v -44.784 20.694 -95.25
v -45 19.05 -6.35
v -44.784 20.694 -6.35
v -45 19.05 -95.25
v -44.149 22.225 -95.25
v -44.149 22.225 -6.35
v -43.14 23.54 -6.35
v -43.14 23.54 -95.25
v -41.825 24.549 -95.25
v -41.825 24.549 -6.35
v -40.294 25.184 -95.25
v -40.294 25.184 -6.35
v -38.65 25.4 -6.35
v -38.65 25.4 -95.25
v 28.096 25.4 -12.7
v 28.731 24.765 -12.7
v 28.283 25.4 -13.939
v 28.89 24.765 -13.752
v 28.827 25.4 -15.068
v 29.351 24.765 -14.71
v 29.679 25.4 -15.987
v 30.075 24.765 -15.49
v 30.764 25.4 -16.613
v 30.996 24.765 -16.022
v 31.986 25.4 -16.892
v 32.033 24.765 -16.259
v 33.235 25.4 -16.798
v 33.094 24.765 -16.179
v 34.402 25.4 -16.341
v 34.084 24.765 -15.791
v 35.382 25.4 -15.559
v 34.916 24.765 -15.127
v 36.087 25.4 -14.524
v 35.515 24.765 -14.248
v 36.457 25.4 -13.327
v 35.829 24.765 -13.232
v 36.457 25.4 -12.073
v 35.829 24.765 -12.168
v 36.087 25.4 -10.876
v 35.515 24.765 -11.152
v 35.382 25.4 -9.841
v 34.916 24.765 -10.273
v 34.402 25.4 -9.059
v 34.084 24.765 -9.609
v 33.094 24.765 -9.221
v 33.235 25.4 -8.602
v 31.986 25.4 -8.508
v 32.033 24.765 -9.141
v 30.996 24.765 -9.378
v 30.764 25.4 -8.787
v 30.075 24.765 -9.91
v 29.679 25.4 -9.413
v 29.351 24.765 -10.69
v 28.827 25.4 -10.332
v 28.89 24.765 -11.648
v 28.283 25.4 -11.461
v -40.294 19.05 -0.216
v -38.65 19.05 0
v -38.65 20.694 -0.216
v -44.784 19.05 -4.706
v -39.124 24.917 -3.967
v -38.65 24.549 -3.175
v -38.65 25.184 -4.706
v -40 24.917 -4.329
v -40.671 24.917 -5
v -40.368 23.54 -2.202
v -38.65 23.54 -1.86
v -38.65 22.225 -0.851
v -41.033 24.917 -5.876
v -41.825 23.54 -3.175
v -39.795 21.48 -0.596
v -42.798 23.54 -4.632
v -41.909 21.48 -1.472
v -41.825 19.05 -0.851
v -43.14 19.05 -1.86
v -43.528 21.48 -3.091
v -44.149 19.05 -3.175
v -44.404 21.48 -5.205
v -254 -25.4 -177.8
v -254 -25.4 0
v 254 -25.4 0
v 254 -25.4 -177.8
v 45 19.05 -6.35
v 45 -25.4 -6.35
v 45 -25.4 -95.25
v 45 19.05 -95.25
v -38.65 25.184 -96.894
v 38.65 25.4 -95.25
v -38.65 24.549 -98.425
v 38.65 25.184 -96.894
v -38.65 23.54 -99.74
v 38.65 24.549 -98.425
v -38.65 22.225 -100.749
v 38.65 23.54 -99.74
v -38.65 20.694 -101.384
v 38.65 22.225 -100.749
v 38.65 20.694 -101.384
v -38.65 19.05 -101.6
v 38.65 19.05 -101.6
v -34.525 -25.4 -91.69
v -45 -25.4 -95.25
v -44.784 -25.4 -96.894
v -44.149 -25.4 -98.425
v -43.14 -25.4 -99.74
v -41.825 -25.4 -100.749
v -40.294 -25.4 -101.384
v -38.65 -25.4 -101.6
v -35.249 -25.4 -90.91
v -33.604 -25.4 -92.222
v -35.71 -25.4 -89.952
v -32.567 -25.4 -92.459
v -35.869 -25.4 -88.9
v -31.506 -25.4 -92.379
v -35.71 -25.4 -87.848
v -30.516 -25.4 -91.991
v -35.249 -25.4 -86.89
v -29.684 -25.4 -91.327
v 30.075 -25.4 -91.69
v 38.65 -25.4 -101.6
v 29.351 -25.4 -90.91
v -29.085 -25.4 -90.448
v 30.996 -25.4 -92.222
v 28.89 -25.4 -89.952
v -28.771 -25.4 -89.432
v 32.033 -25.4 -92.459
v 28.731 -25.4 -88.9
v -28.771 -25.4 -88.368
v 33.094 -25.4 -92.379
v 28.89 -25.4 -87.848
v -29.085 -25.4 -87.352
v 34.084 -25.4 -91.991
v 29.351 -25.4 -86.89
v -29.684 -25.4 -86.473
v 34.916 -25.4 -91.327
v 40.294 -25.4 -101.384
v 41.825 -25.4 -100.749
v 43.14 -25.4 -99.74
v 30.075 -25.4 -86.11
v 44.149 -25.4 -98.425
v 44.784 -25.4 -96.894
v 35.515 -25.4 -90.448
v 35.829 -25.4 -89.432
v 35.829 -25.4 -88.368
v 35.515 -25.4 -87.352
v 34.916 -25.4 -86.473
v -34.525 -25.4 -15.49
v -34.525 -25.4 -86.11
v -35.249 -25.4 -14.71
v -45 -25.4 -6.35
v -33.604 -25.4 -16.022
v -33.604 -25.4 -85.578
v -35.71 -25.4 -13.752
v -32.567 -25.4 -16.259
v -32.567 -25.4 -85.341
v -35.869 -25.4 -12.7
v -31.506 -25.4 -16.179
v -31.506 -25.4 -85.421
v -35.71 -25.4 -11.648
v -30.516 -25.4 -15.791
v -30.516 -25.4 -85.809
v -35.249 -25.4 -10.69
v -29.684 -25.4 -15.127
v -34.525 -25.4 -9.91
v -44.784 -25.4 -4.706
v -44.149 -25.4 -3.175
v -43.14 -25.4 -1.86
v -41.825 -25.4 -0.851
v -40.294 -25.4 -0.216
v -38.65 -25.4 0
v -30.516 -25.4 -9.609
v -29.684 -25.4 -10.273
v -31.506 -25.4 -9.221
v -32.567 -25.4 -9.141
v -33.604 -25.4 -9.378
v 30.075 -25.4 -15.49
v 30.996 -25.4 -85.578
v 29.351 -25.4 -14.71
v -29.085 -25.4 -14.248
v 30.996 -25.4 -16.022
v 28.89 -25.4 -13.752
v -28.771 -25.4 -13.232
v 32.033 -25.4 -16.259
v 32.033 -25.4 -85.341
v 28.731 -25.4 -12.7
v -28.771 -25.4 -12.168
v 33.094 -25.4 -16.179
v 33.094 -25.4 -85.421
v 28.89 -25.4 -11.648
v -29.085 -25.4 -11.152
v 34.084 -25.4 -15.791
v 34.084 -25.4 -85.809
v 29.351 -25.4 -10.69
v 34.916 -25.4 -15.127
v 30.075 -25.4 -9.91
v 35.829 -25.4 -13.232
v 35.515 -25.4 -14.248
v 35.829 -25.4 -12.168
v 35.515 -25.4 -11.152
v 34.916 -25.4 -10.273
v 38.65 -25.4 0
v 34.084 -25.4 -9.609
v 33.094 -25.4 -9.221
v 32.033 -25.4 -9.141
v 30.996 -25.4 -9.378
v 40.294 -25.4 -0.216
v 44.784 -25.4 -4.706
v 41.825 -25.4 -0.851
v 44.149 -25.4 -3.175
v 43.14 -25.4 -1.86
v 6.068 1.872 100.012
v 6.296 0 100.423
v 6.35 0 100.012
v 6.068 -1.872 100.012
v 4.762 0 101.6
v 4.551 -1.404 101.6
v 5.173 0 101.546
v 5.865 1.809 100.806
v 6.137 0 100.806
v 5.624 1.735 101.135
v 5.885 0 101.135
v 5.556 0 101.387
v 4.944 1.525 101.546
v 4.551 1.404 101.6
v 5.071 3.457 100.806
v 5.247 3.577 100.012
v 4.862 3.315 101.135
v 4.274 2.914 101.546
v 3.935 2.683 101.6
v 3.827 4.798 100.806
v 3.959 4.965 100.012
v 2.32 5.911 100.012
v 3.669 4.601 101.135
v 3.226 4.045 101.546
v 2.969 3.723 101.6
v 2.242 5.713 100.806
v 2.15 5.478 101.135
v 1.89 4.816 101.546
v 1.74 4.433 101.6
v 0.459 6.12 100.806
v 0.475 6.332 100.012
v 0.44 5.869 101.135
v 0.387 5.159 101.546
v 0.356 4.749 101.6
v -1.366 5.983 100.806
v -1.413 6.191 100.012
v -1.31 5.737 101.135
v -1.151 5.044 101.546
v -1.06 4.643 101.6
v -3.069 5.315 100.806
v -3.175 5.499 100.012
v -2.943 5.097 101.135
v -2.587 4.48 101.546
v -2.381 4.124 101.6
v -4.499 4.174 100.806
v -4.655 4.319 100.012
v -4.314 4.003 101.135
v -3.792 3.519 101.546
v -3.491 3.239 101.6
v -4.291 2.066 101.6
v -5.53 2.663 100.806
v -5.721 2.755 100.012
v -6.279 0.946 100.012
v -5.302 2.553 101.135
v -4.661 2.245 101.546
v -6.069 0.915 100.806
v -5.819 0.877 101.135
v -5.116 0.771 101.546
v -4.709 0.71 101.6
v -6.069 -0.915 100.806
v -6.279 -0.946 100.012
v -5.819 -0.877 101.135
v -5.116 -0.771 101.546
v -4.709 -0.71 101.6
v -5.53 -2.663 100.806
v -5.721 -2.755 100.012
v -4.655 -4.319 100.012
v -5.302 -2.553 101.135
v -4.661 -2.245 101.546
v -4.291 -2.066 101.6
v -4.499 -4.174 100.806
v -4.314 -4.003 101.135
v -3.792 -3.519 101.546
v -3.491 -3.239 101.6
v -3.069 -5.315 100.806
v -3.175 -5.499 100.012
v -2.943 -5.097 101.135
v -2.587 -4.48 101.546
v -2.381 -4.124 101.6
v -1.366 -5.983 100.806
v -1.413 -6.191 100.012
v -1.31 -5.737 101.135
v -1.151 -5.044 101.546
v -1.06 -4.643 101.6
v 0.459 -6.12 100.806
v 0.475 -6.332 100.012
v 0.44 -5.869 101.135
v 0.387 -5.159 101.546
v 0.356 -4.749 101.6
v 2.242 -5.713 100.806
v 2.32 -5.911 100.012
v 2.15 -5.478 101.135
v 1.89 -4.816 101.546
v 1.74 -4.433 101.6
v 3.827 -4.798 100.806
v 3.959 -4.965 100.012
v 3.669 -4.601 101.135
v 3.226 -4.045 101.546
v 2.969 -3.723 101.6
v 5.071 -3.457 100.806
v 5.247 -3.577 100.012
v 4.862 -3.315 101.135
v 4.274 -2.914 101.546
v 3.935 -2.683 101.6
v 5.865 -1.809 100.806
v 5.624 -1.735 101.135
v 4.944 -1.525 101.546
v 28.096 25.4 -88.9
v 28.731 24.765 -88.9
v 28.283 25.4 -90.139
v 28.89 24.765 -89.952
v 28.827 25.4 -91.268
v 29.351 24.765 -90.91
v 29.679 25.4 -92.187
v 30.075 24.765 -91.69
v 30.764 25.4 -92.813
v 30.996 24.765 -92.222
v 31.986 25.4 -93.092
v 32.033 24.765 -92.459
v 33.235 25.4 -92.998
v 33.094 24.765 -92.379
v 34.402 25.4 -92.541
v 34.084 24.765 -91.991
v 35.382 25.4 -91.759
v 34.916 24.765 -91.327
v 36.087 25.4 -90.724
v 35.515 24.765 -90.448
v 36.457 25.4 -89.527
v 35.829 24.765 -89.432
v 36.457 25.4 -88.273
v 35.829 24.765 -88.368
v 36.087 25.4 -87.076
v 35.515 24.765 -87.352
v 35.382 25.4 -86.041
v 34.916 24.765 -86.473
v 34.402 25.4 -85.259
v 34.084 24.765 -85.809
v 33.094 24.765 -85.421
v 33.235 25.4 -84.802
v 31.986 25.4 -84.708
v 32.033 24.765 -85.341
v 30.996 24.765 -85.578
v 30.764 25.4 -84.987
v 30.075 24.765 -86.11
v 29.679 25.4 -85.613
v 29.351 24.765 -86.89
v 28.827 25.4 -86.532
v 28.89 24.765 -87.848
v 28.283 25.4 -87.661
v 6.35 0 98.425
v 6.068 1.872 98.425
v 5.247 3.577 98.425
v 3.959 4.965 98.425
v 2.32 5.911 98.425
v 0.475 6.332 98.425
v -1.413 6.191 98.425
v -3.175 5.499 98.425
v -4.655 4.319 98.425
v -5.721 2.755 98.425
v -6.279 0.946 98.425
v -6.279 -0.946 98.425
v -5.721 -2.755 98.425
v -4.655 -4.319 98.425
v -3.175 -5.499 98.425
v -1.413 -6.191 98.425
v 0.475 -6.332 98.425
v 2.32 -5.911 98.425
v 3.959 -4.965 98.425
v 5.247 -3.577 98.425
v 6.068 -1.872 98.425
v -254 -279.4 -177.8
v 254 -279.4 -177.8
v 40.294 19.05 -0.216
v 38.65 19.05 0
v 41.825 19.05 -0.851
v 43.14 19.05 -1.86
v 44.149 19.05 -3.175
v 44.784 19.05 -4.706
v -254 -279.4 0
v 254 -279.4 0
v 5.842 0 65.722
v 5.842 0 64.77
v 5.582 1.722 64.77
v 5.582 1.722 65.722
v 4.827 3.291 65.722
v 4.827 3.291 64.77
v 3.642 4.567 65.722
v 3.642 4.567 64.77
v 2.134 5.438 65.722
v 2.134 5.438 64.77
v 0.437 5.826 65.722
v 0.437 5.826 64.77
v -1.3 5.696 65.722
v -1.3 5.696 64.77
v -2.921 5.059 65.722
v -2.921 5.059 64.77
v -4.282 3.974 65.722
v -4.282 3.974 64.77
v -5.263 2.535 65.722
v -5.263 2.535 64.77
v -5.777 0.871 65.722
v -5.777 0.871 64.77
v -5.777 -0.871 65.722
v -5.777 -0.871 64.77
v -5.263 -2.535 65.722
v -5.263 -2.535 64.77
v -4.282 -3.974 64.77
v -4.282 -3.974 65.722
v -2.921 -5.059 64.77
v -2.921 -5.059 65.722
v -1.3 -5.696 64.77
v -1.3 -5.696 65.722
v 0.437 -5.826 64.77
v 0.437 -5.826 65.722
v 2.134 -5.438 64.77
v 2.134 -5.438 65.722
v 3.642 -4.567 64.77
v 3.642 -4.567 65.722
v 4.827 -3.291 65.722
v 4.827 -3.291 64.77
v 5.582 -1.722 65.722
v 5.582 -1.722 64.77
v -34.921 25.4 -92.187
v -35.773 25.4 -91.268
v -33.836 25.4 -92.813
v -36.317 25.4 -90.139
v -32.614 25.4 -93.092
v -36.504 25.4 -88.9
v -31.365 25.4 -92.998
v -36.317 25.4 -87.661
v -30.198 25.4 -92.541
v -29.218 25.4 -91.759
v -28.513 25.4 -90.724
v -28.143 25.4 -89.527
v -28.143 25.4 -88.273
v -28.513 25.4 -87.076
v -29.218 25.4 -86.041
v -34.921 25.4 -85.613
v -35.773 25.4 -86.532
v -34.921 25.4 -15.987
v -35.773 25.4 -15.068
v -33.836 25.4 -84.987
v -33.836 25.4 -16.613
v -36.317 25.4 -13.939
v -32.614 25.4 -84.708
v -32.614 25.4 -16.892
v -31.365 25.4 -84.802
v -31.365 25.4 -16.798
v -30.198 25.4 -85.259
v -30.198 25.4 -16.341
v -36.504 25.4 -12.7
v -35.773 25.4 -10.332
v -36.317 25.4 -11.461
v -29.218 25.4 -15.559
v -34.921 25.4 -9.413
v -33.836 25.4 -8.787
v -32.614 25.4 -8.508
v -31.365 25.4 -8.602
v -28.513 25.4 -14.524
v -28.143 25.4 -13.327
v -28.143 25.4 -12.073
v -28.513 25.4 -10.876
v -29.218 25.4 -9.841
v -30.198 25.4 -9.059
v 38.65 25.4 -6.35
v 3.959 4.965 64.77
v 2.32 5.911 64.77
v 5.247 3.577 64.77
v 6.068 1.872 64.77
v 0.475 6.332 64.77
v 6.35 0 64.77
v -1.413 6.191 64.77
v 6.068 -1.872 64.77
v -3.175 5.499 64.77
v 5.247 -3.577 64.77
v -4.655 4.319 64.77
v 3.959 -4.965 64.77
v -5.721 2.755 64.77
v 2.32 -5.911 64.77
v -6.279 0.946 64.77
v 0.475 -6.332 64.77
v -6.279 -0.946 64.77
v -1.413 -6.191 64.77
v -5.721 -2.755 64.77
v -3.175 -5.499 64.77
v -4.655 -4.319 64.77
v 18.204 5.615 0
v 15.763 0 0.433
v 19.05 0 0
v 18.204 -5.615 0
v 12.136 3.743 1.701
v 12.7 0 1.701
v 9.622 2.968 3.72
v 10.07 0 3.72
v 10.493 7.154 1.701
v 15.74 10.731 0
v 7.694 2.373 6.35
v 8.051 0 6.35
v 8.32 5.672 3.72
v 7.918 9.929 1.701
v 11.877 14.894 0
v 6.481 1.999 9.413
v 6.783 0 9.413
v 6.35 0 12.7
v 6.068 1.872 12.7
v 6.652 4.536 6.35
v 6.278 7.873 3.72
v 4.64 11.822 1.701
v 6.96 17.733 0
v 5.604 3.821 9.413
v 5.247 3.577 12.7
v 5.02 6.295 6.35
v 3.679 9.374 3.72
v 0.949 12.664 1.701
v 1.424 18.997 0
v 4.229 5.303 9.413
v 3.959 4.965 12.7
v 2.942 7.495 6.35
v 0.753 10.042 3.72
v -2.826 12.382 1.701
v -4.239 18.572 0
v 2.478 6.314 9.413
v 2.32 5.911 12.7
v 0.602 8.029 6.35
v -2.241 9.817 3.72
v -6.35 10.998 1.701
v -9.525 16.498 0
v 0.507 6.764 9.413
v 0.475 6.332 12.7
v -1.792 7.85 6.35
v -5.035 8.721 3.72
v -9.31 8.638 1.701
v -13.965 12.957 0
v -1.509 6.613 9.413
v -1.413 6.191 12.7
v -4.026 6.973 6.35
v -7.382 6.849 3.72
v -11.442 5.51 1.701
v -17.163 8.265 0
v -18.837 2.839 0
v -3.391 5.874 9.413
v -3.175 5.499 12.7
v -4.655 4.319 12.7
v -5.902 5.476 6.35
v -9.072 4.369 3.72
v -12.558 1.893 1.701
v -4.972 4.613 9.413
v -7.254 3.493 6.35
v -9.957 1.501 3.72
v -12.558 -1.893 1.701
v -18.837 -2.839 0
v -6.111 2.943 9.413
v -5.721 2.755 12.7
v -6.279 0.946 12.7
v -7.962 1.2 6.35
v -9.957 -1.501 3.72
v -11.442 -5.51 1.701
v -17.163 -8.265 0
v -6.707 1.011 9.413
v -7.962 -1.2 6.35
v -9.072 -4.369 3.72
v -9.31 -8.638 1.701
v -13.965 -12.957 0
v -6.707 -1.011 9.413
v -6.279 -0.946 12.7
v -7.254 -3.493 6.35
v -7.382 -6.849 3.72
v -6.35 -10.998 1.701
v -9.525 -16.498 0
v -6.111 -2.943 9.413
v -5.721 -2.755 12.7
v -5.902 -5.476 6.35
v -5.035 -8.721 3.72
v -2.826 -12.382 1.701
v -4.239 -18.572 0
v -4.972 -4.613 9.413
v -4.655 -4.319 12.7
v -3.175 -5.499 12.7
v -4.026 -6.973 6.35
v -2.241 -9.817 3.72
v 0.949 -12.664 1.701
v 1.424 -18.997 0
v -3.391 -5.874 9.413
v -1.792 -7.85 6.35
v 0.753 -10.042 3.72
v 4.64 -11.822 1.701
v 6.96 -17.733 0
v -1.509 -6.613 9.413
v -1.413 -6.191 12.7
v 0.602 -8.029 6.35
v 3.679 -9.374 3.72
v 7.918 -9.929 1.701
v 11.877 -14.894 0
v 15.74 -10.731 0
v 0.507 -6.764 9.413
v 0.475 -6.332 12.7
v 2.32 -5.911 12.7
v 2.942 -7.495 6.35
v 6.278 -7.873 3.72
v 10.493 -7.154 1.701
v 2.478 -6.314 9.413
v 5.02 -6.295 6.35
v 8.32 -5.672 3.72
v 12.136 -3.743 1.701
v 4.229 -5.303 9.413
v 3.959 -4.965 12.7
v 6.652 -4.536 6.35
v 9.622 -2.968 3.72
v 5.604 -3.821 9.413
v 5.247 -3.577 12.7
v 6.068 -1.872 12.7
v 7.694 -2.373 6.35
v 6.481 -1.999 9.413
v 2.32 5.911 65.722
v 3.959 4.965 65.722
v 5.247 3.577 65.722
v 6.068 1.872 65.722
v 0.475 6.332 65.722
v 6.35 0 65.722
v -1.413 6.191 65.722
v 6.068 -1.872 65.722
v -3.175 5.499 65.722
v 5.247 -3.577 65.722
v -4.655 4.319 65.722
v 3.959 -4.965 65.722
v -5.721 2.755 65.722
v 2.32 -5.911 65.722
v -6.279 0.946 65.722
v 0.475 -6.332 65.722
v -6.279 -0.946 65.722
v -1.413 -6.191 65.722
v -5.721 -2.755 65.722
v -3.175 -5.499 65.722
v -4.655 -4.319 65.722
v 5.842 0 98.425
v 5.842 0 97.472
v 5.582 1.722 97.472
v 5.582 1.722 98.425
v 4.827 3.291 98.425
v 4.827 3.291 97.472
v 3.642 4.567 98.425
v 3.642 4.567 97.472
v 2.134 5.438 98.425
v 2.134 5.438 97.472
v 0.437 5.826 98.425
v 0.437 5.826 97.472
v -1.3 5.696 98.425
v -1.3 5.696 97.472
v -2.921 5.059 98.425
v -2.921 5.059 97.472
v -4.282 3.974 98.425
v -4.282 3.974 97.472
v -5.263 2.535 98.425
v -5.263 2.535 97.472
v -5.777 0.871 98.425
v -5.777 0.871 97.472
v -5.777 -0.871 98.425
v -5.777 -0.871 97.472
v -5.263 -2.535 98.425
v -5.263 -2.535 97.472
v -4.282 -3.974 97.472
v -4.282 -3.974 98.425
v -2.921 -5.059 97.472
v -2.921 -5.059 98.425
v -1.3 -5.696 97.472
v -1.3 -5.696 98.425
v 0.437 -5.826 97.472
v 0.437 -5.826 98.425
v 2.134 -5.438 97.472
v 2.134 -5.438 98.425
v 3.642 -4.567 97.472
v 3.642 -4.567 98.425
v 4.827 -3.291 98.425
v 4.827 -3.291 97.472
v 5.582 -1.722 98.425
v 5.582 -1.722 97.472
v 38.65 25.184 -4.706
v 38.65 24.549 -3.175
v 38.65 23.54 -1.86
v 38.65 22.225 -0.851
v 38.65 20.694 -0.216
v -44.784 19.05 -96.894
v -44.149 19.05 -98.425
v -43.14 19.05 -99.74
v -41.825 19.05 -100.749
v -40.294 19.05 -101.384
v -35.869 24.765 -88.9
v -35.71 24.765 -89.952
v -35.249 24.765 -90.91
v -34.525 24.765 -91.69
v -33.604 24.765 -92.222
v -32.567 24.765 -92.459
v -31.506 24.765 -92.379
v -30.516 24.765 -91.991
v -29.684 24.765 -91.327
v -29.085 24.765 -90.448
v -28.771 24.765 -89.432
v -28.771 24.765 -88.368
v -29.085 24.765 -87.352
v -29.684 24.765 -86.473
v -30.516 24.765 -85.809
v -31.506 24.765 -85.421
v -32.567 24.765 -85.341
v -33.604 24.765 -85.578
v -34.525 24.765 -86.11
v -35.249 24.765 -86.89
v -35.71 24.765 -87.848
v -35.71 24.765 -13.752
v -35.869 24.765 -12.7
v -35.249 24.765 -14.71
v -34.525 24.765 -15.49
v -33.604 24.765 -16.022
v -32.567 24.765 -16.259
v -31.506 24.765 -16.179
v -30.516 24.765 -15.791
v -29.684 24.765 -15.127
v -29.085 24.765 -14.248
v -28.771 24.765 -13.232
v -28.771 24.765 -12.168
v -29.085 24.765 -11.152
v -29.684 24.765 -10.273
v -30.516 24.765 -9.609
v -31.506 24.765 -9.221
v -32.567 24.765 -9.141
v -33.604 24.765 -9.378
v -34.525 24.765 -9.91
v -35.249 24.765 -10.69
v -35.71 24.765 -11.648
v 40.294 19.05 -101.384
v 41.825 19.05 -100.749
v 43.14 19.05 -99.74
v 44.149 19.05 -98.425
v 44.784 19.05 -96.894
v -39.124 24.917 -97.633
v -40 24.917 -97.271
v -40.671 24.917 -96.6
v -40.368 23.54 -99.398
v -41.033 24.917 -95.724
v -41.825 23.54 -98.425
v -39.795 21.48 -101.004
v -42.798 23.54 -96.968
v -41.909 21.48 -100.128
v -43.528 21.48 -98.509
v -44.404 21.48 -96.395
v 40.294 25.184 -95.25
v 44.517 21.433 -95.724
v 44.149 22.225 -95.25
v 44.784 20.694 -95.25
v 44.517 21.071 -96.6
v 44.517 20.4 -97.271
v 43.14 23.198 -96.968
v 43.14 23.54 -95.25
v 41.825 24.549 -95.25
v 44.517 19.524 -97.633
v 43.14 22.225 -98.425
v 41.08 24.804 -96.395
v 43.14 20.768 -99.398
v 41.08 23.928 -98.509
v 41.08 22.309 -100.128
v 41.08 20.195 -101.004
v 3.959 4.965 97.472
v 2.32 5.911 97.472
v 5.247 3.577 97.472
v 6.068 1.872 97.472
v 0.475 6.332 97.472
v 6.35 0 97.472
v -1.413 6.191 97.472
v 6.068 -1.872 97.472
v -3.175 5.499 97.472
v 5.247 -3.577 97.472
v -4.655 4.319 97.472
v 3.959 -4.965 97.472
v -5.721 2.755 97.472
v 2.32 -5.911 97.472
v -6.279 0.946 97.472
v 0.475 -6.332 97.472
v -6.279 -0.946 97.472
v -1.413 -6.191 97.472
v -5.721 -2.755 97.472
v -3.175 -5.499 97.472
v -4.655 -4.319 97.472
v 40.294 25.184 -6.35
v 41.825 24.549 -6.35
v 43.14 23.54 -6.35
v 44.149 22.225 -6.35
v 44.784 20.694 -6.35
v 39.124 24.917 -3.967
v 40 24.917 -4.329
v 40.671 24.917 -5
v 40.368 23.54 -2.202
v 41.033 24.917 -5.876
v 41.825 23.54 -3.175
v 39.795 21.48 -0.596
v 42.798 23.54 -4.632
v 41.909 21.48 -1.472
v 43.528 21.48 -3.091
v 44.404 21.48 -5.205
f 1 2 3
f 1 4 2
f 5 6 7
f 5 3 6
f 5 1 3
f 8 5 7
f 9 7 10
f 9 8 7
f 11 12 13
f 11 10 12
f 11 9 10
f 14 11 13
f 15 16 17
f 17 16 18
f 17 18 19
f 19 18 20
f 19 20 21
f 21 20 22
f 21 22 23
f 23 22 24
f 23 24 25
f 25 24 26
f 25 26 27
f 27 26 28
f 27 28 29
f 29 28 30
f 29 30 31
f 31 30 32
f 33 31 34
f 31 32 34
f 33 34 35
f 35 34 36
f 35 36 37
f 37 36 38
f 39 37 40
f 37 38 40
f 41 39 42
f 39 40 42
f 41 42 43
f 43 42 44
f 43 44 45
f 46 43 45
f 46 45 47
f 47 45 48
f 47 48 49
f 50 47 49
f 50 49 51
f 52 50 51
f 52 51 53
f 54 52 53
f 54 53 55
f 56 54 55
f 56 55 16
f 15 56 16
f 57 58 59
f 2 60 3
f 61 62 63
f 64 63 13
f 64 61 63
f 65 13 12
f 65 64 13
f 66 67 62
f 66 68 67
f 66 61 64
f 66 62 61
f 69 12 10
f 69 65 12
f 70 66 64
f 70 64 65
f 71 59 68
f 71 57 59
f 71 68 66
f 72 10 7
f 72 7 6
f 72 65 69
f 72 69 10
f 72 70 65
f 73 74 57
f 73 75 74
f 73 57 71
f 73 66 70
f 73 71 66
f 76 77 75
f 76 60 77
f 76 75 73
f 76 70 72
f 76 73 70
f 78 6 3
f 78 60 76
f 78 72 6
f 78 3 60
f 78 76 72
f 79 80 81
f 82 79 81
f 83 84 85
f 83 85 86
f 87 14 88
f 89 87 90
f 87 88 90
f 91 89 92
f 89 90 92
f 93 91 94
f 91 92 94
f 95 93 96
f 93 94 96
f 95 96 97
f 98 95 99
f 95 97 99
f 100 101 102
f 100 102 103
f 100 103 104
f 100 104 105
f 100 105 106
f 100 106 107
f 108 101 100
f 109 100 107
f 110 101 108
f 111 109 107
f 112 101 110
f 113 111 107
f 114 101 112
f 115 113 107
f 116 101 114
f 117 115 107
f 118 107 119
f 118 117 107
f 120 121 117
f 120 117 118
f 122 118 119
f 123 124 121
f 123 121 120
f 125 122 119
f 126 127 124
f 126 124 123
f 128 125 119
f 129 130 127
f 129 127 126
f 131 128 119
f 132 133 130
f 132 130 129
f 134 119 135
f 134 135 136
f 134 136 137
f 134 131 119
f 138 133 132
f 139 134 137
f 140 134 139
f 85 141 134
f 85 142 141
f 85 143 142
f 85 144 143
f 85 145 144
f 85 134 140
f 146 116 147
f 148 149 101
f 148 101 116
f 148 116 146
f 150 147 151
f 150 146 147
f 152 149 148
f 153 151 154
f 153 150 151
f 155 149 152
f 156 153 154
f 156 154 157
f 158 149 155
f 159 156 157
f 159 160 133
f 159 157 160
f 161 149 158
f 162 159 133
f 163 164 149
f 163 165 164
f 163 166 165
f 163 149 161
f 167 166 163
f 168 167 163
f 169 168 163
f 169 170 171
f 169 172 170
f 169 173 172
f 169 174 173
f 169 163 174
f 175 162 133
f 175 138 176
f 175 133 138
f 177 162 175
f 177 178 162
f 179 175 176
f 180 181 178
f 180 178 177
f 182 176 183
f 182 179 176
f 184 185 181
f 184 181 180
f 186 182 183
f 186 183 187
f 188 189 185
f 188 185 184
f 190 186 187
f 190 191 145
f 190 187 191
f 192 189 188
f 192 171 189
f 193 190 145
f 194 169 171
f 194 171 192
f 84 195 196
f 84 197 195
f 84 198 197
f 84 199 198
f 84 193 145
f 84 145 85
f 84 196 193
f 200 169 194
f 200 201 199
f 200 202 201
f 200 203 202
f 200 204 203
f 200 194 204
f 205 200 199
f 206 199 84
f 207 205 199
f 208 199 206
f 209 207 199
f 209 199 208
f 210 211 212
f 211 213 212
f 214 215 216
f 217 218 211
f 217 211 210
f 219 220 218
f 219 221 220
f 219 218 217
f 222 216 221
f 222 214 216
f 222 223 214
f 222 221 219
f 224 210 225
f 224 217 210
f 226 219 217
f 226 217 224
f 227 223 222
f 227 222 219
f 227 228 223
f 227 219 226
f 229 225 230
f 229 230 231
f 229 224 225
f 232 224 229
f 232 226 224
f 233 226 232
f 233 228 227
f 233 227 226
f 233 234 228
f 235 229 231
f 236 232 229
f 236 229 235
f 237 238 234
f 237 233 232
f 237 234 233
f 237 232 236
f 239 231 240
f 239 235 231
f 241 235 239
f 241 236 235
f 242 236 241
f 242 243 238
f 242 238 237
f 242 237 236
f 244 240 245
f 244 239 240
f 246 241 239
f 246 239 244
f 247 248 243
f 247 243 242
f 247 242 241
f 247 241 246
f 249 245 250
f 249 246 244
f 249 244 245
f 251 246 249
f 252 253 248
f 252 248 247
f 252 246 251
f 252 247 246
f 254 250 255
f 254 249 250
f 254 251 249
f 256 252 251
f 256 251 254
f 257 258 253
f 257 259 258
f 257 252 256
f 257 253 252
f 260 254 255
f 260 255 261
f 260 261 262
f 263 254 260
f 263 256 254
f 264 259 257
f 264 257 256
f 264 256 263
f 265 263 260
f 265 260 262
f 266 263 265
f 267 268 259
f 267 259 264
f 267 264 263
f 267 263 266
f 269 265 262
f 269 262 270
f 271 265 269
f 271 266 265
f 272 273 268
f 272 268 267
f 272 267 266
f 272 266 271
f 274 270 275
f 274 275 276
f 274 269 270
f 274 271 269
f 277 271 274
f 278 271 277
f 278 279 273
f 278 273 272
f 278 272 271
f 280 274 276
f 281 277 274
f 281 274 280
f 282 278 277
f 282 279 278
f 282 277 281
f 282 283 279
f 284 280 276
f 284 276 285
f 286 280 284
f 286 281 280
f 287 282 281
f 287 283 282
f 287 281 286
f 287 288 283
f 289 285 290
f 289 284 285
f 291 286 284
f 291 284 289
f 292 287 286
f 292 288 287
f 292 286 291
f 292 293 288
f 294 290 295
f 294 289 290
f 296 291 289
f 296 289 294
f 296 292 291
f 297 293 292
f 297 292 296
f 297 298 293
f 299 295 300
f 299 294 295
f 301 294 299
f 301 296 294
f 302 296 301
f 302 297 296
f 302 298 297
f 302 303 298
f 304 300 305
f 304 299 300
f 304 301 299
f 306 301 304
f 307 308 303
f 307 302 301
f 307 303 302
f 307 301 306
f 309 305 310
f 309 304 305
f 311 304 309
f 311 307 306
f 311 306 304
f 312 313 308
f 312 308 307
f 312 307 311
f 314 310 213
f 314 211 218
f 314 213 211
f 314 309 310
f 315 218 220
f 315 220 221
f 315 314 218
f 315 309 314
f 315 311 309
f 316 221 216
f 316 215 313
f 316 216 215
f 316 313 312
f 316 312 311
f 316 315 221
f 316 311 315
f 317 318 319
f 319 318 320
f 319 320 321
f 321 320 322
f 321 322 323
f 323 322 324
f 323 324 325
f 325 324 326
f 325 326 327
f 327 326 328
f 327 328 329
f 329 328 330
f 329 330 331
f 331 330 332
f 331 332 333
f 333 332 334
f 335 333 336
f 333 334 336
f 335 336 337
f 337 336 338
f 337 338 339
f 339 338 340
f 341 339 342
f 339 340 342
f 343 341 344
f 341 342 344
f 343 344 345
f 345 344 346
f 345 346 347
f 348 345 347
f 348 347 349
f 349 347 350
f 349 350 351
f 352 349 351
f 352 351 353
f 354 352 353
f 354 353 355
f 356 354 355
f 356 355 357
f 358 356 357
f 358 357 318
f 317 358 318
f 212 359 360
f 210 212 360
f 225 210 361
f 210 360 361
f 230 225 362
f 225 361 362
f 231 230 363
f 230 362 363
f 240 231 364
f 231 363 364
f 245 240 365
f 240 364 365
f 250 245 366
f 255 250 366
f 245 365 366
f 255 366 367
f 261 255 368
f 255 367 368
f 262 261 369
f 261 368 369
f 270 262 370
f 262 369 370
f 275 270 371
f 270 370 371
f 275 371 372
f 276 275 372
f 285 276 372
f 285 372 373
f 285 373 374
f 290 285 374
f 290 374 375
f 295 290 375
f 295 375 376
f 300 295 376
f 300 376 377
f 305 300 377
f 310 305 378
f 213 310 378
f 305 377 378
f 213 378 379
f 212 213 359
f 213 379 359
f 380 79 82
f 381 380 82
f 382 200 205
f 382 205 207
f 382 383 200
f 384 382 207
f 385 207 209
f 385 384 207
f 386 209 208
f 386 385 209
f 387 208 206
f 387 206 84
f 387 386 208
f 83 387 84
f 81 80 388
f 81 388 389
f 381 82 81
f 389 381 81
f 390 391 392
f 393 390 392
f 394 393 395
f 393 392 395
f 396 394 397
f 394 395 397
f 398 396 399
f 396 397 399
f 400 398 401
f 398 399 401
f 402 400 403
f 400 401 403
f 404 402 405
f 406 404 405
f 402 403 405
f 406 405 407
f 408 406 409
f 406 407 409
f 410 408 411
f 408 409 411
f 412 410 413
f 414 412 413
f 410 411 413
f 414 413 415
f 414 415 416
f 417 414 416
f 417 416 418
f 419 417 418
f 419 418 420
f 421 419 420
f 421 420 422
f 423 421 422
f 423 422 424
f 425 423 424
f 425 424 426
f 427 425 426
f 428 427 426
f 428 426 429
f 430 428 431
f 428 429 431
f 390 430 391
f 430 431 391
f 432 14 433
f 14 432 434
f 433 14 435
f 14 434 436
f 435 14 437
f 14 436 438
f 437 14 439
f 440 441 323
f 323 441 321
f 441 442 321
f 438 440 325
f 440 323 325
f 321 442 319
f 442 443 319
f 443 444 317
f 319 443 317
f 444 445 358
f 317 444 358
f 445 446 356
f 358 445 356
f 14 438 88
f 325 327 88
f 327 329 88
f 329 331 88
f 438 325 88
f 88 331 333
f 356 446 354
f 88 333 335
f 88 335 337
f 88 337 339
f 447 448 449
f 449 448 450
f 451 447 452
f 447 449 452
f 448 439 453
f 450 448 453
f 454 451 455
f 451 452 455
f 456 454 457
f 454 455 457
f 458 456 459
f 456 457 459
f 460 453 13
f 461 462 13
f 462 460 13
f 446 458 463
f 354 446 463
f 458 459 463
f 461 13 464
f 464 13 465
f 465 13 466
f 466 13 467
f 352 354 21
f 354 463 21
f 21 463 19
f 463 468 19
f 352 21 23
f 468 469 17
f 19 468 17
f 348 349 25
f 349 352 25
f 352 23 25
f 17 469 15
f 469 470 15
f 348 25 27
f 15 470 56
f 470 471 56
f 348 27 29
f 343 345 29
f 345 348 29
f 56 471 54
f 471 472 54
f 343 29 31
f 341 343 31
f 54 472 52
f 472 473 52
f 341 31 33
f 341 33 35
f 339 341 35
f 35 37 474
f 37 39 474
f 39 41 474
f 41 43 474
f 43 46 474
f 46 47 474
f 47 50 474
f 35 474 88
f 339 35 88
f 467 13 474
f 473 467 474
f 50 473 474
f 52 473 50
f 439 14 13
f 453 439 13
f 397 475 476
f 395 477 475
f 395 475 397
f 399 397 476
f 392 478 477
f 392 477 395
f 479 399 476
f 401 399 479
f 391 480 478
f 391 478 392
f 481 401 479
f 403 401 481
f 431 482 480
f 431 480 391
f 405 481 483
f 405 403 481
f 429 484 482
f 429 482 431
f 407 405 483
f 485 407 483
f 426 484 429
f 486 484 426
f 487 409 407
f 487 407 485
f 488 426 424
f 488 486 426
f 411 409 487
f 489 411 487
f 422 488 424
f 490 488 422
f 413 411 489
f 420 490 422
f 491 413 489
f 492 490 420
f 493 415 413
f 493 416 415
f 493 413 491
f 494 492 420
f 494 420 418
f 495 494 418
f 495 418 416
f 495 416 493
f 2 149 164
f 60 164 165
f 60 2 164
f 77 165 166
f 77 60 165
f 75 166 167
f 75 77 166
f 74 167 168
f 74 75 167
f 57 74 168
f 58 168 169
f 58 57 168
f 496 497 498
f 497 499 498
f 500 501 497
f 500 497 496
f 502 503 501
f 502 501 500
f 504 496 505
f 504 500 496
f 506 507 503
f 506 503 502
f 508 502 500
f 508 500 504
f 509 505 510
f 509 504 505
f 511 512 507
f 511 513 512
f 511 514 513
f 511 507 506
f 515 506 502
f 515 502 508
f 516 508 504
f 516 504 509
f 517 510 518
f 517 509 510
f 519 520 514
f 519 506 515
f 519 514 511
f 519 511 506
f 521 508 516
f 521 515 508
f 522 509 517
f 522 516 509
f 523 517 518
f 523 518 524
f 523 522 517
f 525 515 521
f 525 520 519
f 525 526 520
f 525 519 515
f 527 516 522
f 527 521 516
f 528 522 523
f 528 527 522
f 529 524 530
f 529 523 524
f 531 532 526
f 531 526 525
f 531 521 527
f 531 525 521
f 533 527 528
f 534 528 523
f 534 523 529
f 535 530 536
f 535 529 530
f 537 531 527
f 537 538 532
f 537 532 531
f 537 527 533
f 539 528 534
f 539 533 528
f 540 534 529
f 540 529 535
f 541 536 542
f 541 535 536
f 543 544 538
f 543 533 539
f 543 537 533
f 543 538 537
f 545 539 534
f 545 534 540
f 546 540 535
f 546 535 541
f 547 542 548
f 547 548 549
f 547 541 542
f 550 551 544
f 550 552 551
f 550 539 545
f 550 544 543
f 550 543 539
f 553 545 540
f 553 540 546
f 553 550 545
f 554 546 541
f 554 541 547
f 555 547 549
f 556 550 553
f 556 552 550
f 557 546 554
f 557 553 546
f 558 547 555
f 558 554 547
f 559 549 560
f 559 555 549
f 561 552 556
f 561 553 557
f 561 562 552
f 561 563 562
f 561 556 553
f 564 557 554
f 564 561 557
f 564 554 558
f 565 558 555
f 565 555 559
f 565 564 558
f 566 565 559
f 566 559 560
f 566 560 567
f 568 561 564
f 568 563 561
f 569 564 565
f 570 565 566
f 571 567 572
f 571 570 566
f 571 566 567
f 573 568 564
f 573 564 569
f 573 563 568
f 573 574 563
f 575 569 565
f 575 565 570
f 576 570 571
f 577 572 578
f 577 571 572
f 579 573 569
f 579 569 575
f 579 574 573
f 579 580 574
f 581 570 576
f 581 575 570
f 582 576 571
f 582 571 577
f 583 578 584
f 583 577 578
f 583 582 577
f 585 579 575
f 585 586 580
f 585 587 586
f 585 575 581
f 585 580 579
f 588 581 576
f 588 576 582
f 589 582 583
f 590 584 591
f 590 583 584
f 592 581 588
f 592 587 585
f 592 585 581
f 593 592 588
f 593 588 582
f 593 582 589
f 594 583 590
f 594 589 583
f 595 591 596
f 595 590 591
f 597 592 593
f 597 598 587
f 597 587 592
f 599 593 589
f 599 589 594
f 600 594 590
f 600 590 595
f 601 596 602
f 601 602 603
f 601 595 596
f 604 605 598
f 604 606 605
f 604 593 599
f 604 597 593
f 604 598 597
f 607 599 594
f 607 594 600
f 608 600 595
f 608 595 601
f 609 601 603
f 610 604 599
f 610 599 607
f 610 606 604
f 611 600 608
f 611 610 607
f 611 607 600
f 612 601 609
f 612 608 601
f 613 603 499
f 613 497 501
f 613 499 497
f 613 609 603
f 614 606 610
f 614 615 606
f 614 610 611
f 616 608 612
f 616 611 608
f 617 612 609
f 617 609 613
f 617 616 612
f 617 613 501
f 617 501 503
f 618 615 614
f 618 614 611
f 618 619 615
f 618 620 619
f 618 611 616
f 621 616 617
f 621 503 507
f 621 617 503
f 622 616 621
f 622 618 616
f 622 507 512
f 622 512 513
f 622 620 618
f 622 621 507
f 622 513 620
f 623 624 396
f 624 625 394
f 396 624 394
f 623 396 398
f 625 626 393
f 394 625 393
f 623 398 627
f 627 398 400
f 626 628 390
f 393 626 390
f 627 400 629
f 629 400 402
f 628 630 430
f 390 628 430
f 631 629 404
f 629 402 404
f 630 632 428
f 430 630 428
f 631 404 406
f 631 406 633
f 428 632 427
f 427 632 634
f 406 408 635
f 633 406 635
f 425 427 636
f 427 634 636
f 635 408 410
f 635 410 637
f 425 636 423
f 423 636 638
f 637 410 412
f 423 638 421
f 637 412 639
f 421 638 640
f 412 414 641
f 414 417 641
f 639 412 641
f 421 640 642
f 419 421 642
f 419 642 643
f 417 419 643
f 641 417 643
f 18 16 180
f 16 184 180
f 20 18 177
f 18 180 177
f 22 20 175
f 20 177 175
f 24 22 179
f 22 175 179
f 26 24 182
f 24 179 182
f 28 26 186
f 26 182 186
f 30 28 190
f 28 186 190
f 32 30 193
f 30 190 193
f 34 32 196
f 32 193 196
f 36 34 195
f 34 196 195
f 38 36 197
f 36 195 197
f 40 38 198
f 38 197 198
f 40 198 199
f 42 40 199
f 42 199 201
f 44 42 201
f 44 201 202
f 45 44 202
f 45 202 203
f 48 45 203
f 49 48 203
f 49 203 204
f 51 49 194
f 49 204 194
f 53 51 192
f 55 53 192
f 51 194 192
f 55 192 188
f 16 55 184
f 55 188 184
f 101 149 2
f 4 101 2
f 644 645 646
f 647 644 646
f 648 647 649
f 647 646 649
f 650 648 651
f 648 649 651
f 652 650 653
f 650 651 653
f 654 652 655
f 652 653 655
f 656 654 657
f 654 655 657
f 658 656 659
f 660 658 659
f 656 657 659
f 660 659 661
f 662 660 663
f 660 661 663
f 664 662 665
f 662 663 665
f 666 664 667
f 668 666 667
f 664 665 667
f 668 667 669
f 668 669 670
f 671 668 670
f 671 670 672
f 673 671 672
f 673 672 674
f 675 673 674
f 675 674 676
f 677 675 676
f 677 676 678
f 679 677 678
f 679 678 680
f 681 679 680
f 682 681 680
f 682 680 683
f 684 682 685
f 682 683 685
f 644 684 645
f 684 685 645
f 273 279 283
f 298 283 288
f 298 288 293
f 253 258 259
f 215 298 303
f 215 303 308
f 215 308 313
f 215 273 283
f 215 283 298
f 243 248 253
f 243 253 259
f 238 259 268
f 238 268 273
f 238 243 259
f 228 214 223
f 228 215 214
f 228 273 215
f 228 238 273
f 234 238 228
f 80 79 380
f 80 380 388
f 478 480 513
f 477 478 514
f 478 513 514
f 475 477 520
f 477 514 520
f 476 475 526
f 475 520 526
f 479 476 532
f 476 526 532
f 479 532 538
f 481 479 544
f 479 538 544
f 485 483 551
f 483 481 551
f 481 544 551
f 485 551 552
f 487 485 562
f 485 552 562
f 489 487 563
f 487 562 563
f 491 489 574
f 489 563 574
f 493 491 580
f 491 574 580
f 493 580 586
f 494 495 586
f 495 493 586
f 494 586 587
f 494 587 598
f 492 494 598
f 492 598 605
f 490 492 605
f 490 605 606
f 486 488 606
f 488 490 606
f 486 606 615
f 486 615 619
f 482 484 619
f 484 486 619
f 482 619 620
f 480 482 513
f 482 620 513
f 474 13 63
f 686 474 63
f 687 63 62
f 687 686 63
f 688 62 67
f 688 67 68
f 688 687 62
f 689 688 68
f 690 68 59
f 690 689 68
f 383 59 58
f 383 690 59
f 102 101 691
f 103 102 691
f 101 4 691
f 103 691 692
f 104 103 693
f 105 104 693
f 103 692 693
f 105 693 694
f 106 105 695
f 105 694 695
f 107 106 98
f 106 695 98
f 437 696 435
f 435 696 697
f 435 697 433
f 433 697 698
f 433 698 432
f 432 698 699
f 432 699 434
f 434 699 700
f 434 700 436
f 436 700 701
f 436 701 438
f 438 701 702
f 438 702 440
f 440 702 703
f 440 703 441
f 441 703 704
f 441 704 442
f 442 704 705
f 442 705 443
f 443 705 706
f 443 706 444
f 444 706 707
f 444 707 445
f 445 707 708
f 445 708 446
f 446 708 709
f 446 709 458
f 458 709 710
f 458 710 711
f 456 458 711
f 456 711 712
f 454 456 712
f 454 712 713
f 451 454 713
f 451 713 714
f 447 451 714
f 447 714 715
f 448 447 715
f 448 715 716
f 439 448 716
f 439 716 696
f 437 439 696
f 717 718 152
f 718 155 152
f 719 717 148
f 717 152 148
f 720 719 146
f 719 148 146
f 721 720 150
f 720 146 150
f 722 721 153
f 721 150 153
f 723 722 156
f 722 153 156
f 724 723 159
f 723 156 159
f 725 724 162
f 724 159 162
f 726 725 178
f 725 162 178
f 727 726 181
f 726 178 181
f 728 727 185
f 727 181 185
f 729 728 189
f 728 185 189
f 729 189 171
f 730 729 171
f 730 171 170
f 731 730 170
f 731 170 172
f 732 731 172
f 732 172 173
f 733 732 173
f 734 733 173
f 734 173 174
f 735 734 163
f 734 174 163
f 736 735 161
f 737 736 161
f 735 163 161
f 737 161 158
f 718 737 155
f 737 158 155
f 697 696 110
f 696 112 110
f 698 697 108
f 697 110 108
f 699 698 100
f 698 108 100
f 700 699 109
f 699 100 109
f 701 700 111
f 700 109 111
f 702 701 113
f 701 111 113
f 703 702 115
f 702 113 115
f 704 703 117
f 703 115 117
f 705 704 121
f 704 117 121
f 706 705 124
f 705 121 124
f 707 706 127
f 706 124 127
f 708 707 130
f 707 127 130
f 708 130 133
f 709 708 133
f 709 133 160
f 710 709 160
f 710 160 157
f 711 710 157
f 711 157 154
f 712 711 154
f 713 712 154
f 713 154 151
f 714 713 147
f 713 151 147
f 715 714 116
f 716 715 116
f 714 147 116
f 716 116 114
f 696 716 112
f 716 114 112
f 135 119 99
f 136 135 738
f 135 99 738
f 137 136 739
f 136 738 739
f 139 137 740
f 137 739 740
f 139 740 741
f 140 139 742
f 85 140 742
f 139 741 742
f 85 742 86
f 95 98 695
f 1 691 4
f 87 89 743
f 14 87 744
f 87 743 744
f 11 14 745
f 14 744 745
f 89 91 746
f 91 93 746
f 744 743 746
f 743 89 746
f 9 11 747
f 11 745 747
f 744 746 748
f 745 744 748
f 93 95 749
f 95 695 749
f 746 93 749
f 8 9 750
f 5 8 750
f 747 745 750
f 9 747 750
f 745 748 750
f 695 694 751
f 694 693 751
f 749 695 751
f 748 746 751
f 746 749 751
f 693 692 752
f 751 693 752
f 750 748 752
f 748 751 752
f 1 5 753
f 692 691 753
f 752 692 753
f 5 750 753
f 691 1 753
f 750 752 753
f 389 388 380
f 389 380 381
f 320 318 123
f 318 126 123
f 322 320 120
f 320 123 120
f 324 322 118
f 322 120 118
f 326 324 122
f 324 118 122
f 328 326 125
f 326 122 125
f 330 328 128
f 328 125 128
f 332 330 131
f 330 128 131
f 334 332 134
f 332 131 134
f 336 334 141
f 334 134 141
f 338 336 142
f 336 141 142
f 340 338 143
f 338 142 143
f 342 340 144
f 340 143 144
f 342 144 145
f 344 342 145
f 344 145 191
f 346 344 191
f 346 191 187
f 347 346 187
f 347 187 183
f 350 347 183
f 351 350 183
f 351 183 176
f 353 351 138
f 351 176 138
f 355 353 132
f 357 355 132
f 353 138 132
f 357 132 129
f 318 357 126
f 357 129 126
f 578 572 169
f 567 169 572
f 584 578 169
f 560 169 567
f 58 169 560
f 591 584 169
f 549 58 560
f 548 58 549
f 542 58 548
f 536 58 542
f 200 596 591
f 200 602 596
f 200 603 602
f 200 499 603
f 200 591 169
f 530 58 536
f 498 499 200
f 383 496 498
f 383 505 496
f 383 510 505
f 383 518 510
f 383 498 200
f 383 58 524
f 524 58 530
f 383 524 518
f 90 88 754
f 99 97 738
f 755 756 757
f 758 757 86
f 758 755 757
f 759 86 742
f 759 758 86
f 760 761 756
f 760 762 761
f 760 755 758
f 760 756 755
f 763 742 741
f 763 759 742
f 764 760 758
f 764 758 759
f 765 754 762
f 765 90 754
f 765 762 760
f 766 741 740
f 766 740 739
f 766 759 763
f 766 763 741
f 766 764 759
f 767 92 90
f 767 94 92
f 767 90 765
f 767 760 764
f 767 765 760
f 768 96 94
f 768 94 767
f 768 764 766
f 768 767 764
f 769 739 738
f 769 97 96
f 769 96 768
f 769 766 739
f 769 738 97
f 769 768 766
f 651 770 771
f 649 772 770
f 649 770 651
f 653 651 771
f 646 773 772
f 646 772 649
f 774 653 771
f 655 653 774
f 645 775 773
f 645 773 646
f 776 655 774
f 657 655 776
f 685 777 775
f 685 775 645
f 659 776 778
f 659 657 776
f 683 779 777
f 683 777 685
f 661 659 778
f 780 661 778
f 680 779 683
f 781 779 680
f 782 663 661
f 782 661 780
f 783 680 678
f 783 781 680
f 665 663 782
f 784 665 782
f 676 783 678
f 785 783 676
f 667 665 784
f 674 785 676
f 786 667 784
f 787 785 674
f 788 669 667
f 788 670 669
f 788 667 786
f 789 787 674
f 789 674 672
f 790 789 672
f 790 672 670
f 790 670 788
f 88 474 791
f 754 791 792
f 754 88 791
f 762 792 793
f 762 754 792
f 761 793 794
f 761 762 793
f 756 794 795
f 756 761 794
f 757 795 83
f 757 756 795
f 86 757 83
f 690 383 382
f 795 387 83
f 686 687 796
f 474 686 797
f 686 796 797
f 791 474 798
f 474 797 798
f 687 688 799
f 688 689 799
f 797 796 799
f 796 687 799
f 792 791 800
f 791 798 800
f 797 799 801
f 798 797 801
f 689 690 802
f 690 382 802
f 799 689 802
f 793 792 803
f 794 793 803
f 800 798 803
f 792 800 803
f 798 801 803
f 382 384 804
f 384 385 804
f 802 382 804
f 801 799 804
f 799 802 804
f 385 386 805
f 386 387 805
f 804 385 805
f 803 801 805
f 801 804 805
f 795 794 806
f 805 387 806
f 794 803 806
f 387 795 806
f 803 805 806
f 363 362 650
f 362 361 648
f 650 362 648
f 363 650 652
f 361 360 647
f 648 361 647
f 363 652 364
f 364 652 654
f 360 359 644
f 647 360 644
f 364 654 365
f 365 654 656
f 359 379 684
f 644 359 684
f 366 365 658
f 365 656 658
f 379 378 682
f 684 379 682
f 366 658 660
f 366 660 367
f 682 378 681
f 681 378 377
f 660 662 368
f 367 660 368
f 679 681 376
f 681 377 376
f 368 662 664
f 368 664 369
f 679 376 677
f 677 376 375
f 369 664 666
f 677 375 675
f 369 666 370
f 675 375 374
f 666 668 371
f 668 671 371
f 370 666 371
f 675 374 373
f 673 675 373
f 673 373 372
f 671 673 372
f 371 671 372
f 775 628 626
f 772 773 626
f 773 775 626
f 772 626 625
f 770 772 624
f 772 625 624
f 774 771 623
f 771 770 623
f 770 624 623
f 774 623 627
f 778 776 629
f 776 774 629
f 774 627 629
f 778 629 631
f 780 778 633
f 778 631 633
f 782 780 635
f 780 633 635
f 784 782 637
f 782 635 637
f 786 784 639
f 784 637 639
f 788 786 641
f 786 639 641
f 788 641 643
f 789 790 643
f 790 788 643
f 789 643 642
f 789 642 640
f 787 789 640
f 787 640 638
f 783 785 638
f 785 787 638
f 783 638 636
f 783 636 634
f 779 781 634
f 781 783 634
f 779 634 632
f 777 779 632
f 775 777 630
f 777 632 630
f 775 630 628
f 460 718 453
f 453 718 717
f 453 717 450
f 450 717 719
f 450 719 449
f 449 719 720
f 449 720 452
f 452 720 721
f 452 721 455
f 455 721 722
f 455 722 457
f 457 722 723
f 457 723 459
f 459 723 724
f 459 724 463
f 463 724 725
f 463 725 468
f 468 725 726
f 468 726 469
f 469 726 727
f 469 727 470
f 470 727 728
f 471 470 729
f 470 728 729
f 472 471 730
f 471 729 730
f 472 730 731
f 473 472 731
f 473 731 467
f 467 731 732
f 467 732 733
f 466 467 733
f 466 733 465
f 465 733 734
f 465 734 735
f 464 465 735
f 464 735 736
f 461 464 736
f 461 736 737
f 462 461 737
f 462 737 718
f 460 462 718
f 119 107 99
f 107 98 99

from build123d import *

# Parameters (mm, degrees)
SKETCH1_W                         = 90
SKETCH1_H                         = 50.8
BOSS_EXTRUDE1_DEPTH               = 101.6
SKETCH1_3_R                       = 6.35
BOSS_EXTRUDE2_DEPTH               = 101.6
FILLET1_R                         = 6.35
FILLET2_R                         = 12.7
F_1_4_CLEARANCE_HOLE1_D           = 7.1374
F_1_4_CLEARANCE_HOLE1_CSINK_D     = 8.4074
F_1_4_CLEARANCE_HOLE1_CSINK_ANGLE = 90
SKETCH7_R                         = 6.35
SKETCH7_R_2                       = 5.842
CUT_EXTRUDE1_DEPTH                = 0.9525
CUT_EXTRUDE2_START                = -0.9525
SKETCH8_R                         = 6.35
SKETCH8_R_2                       = 5.842
CUT_EXTRUDE2_DEPTH                = 0.9525
FILLET3_R                         = 1.5875
SKETCH11_W                        = 508
SKETCH11_H                        = 177.8
BOSS_EXTRUDE3_DEPTH               = 254


with BuildPart() as part:
    # Sketch1 → Boss-Extrude1 (new body)
    with BuildSketch(Plane.XY):
        Rectangle(SKETCH1_W, SKETCH1_H)
    extrude(amount=-BOSS_EXTRUDE1_DEPTH)

    # Sketch1<3> → Boss-Extrude2 (add)
    with BuildSketch(Plane.XY):
        Circle(SKETCH1_3_R)
    extrude(amount=BOSS_EXTRUDE2_DEPTH)

    # Fillet1
    fillet1_edges = [part.edges().sort_by_distance(p)[0] for p in [
        (-45, 0, -101.6),
        (0, 25.4, -101.6),
        (-45, 0, 0),
        (45, 0, 0),
        (0, 25.4, 0),
        (-45, 25.4, -50.8),
        (45, 25.4, -50.8),
        (45, 0, -101.6),
    ]]
    fillet(fillet1_edges, radius=FILLET1_R)

    # Fillet2
    fillet2_edges = [part.edges().sort_by_distance(p)[0] for p in [
        (-6.35, 0, 0),
    ]]
    fillet(fillet2_edges, radius=FILLET2_R - 0.0001)  # a hair under: the kernel refuses the full size

    # 1/4 Clearance Hole1 (through all)
    with Locations(Plane(origin=(0, 25.4, 0), x_dir=(1, 0, 0), z_dir=(0, 1, 0))):
        with Locations((-32.3, 88.9), (-32.3, 12.7), (32.3, 12.7), (32.3, 88.9)):
            CounterSinkHole(F_1_4_CLEARANCE_HOLE1_D / 2, F_1_4_CLEARANCE_HOLE1_CSINK_D / 2, counter_sink_angle=F_1_4_CLEARANCE_HOLE1_CSINK_ANGLE)

    # Sketch7 → Cut-Extrude1 (cut)
    with BuildSketch(Plane.XY.offset(97.4725)):
        with Locations(Location((0, 0, 0), (0, 0, 180))):
            Circle(SKETCH7_R)
        Circle(SKETCH7_R_2, mode=Mode.SUBTRACT)
    extrude(amount=CUT_EXTRUDE1_DEPTH, mode=Mode.SUBTRACT)

    # Sketch8 → Cut-Extrude2 (cut)
    with BuildSketch(Plane.XY.offset(65.7225).offset(CUT_EXTRUDE2_START)):
        with Locations(Location((0, 0, 0), (0, 0, 180))):
            Circle(SKETCH8_R)
        Circle(SKETCH8_R_2, mode=Mode.SUBTRACT)
    extrude(amount=CUT_EXTRUDE2_DEPTH, mode=Mode.SUBTRACT)

    # Fillet3
    fillet3_edges = [part.edges().sort_by_distance(p)[0] for p in [
        (-6.35, 0, 101.6),
    ]]
    fillet(fillet3_edges, radius=FILLET3_R)


with BuildPart() as body_2:
    # Sketch11 → Boss-Extrude3 (new body)
    with BuildSketch(Plane.XZ.offset(25.4)):
        with Locations((0, -88.9)):
            Rectangle(SKETCH11_W, SKETCH11_H)
    extrude(amount=BOSS_EXTRUDE3_DEPTH)


solid = Compound([part.part, body_2.part])
